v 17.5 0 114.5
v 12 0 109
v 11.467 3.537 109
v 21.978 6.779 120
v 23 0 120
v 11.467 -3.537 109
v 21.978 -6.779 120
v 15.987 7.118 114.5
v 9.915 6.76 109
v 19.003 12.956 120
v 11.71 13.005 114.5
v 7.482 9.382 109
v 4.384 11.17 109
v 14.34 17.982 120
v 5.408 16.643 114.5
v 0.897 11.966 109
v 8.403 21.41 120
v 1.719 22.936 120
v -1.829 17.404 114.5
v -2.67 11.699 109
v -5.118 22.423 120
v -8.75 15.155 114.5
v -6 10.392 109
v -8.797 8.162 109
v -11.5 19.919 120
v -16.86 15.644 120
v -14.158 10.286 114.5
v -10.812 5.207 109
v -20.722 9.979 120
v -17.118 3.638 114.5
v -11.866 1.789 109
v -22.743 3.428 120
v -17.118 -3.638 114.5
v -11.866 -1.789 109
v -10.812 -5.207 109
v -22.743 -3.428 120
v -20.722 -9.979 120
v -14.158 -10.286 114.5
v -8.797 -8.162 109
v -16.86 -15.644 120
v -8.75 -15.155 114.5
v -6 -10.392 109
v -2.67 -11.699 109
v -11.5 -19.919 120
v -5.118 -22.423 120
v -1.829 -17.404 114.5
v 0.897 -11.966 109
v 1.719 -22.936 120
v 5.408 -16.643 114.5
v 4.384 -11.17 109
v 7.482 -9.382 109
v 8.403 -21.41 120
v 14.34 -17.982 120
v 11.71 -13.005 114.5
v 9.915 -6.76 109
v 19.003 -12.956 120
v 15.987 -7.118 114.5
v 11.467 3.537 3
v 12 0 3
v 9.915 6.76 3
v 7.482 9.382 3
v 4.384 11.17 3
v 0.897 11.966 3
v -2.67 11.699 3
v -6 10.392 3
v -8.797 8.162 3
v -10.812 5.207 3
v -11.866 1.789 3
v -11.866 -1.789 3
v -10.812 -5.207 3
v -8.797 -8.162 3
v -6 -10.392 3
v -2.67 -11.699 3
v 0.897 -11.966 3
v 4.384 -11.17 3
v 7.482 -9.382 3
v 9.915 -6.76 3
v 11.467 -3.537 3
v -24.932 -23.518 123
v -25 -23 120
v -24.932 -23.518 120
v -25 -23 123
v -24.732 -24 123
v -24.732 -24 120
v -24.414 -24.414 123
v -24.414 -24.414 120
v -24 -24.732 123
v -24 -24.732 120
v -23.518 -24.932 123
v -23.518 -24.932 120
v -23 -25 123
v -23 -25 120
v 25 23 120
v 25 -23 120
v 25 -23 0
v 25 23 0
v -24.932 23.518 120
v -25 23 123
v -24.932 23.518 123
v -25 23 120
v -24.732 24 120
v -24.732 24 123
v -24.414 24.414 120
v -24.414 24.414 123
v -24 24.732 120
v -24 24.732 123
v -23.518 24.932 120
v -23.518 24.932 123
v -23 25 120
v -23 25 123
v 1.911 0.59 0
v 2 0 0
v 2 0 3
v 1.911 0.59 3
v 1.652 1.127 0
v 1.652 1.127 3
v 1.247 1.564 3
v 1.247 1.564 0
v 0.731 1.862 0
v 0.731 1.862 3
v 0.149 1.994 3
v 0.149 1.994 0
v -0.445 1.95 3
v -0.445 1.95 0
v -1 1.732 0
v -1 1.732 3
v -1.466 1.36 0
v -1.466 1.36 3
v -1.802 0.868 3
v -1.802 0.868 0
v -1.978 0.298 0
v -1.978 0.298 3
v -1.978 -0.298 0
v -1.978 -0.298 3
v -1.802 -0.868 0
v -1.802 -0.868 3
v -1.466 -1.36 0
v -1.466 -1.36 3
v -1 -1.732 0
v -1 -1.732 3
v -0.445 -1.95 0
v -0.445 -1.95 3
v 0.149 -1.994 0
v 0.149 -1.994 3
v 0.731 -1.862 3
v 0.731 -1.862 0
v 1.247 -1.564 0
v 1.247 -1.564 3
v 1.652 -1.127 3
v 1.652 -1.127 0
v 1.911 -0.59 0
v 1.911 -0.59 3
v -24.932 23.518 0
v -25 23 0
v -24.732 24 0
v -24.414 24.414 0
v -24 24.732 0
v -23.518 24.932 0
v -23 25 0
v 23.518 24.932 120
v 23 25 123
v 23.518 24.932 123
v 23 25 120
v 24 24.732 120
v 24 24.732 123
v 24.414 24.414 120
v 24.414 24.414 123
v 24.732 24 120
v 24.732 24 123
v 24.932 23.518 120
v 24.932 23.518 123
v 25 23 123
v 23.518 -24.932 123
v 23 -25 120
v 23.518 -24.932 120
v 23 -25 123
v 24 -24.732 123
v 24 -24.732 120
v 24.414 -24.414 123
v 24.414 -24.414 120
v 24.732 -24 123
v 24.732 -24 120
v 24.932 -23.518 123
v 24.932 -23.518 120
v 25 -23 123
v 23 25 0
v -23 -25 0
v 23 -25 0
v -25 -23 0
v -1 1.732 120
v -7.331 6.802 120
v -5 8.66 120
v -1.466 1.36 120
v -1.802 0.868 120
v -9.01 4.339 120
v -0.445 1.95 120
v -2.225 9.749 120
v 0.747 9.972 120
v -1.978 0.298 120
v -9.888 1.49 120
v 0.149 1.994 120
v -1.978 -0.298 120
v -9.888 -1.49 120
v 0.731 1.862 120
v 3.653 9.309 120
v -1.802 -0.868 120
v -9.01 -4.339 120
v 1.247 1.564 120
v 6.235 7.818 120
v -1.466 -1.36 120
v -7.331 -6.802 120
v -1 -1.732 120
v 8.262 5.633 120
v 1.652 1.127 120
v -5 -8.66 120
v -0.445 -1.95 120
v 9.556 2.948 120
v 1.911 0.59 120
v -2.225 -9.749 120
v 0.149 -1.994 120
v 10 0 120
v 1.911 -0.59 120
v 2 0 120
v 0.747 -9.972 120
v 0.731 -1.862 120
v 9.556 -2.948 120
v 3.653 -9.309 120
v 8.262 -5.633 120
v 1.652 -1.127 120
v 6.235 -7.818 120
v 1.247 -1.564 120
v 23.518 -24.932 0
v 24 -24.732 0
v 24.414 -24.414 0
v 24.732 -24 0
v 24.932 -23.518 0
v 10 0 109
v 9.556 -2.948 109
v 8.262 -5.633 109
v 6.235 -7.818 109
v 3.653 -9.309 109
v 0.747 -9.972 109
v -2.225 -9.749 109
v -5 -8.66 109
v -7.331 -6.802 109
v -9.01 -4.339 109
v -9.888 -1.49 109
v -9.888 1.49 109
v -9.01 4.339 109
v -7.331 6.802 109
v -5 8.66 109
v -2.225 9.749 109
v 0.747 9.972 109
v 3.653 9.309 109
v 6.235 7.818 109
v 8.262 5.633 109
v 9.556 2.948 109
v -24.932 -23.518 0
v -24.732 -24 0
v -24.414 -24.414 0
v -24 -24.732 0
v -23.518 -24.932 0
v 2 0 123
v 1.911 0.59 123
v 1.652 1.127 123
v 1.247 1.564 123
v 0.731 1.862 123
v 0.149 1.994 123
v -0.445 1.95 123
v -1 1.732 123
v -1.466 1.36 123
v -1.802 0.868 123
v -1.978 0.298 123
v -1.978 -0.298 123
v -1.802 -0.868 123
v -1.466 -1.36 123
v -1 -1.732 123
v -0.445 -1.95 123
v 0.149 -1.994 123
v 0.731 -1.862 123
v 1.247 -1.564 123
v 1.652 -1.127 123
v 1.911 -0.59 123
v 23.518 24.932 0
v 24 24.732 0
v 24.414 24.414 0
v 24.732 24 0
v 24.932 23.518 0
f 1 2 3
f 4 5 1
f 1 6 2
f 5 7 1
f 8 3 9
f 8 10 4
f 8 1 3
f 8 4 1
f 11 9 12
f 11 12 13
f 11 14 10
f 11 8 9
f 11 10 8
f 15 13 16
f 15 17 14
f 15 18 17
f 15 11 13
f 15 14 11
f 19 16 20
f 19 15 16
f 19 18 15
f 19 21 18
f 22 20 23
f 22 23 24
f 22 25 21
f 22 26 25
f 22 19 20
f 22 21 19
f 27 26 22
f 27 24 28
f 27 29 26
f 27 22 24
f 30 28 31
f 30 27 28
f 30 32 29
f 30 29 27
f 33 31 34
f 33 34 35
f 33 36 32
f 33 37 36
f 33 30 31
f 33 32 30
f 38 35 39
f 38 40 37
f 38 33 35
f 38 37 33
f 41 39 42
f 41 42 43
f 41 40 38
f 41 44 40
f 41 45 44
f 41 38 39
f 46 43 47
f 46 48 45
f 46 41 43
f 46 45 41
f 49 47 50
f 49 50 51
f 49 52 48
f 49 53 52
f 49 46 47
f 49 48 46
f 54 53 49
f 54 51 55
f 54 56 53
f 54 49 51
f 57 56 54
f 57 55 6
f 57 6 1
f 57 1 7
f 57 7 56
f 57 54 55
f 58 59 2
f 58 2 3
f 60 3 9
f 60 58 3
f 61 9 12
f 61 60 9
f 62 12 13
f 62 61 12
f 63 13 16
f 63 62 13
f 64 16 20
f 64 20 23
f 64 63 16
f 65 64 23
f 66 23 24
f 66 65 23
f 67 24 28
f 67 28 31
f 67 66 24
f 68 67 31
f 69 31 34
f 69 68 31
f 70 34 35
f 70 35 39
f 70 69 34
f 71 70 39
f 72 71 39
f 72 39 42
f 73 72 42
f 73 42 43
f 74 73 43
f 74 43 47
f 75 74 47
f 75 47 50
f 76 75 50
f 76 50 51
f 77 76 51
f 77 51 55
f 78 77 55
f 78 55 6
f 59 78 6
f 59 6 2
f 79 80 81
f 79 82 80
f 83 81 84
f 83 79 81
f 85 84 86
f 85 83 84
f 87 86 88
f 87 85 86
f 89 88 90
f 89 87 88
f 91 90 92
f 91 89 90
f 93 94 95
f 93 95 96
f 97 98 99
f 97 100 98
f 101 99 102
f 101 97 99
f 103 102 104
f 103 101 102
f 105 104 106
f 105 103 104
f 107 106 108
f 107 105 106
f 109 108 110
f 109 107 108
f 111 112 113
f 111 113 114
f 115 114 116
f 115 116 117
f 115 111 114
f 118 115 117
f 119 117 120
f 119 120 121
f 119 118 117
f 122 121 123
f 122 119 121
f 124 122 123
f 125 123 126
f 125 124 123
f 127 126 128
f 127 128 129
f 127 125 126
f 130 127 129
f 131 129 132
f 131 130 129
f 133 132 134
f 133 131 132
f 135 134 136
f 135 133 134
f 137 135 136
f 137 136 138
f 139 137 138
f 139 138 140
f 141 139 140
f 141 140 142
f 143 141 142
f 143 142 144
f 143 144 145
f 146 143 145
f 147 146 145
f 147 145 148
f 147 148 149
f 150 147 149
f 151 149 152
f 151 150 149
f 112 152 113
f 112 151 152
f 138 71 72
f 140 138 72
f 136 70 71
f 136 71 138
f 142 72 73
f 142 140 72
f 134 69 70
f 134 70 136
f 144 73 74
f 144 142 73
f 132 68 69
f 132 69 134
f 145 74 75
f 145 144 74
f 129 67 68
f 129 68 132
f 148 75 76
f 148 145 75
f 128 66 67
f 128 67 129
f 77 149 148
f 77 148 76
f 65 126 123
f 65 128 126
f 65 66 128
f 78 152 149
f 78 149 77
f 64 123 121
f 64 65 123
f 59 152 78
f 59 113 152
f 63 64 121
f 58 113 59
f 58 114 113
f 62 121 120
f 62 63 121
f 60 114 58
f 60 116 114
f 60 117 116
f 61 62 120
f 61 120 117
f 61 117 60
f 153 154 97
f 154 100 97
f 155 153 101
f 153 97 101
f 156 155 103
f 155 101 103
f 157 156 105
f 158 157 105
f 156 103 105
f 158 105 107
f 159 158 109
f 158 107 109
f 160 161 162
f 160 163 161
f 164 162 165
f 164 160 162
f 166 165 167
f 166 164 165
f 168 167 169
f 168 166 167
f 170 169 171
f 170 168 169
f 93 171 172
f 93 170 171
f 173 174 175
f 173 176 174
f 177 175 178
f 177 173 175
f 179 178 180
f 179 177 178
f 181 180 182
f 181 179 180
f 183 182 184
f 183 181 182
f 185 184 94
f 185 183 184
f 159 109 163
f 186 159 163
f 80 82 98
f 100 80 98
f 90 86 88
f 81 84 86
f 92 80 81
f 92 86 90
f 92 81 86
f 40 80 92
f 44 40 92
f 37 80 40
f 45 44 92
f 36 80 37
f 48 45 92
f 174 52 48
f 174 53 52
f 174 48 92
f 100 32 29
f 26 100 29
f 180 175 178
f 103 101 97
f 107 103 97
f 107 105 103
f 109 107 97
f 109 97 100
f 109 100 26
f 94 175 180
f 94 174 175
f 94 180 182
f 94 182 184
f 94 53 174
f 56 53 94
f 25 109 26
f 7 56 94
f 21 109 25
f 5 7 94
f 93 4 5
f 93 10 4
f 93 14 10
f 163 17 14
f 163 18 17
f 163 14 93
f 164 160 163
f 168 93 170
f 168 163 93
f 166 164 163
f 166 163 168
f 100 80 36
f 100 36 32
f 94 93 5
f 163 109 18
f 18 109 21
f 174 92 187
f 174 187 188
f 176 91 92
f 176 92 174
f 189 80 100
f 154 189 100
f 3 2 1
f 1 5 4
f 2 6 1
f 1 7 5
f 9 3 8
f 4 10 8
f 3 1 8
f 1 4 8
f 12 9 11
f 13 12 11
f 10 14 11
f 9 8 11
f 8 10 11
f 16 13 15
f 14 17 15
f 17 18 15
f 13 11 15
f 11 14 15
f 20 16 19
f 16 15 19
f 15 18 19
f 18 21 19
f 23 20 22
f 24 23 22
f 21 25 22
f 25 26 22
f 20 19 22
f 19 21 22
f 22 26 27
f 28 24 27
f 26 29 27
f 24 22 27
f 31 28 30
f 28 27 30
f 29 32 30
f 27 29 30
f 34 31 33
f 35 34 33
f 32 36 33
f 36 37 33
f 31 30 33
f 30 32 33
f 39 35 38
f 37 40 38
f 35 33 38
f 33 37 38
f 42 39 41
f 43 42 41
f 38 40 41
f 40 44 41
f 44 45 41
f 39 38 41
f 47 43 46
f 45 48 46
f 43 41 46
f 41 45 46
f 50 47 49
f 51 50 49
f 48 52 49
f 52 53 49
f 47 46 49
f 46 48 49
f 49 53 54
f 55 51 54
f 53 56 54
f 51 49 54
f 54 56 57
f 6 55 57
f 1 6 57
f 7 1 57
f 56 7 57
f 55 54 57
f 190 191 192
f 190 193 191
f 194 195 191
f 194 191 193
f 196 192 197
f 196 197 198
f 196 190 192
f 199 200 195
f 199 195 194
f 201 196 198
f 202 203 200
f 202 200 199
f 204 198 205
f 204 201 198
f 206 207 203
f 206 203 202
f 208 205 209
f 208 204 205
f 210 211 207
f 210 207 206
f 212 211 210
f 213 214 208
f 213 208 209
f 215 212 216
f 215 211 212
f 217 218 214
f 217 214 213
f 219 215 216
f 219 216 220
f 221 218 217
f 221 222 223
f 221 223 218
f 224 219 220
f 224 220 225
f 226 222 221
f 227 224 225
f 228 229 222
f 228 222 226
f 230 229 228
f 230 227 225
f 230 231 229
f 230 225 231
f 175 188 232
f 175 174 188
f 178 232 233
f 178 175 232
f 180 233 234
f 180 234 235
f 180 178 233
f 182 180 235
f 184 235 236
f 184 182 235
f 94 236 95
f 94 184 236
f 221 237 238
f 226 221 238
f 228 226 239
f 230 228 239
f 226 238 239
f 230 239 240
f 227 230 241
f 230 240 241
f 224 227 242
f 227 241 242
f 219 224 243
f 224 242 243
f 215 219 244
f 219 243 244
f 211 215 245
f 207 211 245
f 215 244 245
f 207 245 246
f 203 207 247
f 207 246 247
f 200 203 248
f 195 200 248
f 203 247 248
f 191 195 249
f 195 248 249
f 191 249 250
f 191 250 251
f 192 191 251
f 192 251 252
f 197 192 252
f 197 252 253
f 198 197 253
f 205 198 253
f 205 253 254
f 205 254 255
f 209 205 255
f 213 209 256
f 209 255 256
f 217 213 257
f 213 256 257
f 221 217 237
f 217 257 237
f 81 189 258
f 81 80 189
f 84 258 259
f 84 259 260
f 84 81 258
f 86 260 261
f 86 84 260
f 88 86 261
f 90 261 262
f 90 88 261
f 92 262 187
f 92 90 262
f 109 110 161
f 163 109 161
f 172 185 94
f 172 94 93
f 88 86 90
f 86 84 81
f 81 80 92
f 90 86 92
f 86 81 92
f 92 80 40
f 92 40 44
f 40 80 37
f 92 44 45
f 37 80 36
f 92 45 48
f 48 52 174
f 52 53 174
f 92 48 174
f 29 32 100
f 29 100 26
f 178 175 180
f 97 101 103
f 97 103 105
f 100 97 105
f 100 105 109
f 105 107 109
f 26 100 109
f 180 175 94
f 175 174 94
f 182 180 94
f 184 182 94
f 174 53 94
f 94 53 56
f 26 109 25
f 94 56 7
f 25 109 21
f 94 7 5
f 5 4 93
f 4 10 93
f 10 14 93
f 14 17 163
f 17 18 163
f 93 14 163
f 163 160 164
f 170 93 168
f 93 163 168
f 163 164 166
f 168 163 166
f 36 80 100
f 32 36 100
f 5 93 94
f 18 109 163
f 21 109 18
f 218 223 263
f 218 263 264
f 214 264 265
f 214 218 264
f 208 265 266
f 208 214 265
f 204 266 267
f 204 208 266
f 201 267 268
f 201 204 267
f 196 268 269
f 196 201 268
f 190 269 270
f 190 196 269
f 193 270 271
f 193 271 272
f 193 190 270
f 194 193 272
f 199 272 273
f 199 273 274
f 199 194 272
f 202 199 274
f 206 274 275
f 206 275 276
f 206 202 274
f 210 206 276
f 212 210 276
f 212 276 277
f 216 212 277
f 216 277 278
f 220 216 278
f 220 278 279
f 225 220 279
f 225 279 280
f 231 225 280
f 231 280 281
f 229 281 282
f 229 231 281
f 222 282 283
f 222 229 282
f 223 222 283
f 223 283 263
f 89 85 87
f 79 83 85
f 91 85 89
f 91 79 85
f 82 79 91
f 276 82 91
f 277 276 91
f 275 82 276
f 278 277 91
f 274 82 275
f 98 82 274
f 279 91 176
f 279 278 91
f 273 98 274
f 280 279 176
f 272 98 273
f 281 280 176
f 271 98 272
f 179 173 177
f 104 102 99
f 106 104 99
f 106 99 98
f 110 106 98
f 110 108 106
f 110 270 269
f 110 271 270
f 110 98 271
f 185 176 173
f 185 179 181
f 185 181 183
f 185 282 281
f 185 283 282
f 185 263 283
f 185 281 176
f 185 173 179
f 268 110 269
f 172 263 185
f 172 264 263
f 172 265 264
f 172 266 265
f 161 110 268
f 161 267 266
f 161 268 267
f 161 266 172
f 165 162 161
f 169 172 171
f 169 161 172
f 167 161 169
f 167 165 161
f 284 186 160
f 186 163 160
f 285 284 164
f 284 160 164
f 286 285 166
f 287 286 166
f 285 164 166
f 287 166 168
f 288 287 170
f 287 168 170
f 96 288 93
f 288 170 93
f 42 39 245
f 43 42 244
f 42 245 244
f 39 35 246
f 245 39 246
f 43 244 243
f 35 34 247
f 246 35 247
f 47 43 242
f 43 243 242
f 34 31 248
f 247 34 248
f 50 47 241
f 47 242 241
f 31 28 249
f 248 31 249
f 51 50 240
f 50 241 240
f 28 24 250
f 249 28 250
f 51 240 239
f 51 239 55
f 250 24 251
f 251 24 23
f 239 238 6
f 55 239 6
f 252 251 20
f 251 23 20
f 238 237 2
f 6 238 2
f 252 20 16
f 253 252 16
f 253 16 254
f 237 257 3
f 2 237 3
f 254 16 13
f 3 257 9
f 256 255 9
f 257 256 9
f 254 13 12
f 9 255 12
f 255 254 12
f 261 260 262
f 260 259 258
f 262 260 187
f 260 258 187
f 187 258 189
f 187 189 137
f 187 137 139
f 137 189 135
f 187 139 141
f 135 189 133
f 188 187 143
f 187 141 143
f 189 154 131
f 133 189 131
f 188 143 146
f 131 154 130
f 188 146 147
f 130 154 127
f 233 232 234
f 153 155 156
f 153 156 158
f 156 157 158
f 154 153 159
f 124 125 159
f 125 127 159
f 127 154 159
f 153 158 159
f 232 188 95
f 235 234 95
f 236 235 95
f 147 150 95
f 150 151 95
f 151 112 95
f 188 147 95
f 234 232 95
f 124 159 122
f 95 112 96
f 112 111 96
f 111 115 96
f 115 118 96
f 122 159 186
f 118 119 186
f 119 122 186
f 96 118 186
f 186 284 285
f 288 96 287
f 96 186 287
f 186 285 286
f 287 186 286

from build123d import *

# Parameters (mm, degrees)
F0_W          = 50
F0_H          = 50
F0_R          = 12
F1_DEPTH      = 120
F0_R_2        = 2
F2_DEPTH      = 3
F3_SIZE       = 11
F4_W          = 50
F4_H          = 50
F4_R          = 2
F5_DEPTH      = 3
F5_DEPTH_BACK = 11
F7_R          = 10
F8_DEPTH      = 11
F9_R          = 2
F9_2_R        = 2


# Not quite as in the source:
# - a feature names something its author has since deleted; it is built from what else it names


with BuildPart() as f1:
    # F0 (on Top) → F1 (new body)
    with BuildSketch(Plane.XY):
        Rectangle(F0_W, F0_H)
        Circle(F0_R, mode=Mode.SUBTRACT)
    extrude(amount=F1_DEPTH)

    # F0 (on Top) → F2 (join)
    with BuildSketch(Plane.XY):
        Circle(F0_R)
        Circle(F0_R_2, mode=Mode.SUBTRACT)
    extrude(amount=F2_DEPTH)

    # F3
    f3_edges = [f1.edges().sort_by_distance(p)[0] for p in [
        (-12, 0, 120),
    ]]
    chamfer(f3_edges, length=F3_SIZE)


with BuildPart() as f5:
    # F4 (on face) → F5 (new body, two sides)
    with BuildSketch(Plane.XY.offset(120)) as f5_sk:
        Rectangle(F4_W, F4_H)
        Circle(F4_R, mode=Mode.SUBTRACT)
    extrude(amount=F5_DEPTH)
    extrude(f5_sk.sketch, amount=-F5_DEPTH_BACK)

    # F6: cut F1
    add(f1.part, mode=Mode.SUBTRACT)

    # F7 (on face) → F8 (cut, through all)
    with BuildSketch(Plane(origin=(0, 0, 109), x_dir=(1, 0, 0), z_dir=(0, 0, -1))):
        Circle(F7_R)
    extrude(amount=-F8_DEPTH, mode=Mode.SUBTRACT)

    # F9#2
    f9_2_edges = [f5.edges().sort_by_distance(p)[0] for p in [
        (25, -25, 121.5),
        (25, 25, 121.5),
        (-25, 25, 121.5),
        (-25, -25, 121.5),
    ]]
    fillet(f9_2_edges, radius=F9_2_R)


with BuildPart() as f1_1:
    add(f1.part)

    # F9
    f9_edges = [f1_1.edges().sort_by_distance(p)[0] for p in [
        (25, -25, 60),
        (25, 25, 60),
        (-25, 25, 60),
        (-25, -25, 60),
    ]]
    fillet(f9_edges, radius=F9_R)


solid = Compound([f5.part, f1_1.part])
